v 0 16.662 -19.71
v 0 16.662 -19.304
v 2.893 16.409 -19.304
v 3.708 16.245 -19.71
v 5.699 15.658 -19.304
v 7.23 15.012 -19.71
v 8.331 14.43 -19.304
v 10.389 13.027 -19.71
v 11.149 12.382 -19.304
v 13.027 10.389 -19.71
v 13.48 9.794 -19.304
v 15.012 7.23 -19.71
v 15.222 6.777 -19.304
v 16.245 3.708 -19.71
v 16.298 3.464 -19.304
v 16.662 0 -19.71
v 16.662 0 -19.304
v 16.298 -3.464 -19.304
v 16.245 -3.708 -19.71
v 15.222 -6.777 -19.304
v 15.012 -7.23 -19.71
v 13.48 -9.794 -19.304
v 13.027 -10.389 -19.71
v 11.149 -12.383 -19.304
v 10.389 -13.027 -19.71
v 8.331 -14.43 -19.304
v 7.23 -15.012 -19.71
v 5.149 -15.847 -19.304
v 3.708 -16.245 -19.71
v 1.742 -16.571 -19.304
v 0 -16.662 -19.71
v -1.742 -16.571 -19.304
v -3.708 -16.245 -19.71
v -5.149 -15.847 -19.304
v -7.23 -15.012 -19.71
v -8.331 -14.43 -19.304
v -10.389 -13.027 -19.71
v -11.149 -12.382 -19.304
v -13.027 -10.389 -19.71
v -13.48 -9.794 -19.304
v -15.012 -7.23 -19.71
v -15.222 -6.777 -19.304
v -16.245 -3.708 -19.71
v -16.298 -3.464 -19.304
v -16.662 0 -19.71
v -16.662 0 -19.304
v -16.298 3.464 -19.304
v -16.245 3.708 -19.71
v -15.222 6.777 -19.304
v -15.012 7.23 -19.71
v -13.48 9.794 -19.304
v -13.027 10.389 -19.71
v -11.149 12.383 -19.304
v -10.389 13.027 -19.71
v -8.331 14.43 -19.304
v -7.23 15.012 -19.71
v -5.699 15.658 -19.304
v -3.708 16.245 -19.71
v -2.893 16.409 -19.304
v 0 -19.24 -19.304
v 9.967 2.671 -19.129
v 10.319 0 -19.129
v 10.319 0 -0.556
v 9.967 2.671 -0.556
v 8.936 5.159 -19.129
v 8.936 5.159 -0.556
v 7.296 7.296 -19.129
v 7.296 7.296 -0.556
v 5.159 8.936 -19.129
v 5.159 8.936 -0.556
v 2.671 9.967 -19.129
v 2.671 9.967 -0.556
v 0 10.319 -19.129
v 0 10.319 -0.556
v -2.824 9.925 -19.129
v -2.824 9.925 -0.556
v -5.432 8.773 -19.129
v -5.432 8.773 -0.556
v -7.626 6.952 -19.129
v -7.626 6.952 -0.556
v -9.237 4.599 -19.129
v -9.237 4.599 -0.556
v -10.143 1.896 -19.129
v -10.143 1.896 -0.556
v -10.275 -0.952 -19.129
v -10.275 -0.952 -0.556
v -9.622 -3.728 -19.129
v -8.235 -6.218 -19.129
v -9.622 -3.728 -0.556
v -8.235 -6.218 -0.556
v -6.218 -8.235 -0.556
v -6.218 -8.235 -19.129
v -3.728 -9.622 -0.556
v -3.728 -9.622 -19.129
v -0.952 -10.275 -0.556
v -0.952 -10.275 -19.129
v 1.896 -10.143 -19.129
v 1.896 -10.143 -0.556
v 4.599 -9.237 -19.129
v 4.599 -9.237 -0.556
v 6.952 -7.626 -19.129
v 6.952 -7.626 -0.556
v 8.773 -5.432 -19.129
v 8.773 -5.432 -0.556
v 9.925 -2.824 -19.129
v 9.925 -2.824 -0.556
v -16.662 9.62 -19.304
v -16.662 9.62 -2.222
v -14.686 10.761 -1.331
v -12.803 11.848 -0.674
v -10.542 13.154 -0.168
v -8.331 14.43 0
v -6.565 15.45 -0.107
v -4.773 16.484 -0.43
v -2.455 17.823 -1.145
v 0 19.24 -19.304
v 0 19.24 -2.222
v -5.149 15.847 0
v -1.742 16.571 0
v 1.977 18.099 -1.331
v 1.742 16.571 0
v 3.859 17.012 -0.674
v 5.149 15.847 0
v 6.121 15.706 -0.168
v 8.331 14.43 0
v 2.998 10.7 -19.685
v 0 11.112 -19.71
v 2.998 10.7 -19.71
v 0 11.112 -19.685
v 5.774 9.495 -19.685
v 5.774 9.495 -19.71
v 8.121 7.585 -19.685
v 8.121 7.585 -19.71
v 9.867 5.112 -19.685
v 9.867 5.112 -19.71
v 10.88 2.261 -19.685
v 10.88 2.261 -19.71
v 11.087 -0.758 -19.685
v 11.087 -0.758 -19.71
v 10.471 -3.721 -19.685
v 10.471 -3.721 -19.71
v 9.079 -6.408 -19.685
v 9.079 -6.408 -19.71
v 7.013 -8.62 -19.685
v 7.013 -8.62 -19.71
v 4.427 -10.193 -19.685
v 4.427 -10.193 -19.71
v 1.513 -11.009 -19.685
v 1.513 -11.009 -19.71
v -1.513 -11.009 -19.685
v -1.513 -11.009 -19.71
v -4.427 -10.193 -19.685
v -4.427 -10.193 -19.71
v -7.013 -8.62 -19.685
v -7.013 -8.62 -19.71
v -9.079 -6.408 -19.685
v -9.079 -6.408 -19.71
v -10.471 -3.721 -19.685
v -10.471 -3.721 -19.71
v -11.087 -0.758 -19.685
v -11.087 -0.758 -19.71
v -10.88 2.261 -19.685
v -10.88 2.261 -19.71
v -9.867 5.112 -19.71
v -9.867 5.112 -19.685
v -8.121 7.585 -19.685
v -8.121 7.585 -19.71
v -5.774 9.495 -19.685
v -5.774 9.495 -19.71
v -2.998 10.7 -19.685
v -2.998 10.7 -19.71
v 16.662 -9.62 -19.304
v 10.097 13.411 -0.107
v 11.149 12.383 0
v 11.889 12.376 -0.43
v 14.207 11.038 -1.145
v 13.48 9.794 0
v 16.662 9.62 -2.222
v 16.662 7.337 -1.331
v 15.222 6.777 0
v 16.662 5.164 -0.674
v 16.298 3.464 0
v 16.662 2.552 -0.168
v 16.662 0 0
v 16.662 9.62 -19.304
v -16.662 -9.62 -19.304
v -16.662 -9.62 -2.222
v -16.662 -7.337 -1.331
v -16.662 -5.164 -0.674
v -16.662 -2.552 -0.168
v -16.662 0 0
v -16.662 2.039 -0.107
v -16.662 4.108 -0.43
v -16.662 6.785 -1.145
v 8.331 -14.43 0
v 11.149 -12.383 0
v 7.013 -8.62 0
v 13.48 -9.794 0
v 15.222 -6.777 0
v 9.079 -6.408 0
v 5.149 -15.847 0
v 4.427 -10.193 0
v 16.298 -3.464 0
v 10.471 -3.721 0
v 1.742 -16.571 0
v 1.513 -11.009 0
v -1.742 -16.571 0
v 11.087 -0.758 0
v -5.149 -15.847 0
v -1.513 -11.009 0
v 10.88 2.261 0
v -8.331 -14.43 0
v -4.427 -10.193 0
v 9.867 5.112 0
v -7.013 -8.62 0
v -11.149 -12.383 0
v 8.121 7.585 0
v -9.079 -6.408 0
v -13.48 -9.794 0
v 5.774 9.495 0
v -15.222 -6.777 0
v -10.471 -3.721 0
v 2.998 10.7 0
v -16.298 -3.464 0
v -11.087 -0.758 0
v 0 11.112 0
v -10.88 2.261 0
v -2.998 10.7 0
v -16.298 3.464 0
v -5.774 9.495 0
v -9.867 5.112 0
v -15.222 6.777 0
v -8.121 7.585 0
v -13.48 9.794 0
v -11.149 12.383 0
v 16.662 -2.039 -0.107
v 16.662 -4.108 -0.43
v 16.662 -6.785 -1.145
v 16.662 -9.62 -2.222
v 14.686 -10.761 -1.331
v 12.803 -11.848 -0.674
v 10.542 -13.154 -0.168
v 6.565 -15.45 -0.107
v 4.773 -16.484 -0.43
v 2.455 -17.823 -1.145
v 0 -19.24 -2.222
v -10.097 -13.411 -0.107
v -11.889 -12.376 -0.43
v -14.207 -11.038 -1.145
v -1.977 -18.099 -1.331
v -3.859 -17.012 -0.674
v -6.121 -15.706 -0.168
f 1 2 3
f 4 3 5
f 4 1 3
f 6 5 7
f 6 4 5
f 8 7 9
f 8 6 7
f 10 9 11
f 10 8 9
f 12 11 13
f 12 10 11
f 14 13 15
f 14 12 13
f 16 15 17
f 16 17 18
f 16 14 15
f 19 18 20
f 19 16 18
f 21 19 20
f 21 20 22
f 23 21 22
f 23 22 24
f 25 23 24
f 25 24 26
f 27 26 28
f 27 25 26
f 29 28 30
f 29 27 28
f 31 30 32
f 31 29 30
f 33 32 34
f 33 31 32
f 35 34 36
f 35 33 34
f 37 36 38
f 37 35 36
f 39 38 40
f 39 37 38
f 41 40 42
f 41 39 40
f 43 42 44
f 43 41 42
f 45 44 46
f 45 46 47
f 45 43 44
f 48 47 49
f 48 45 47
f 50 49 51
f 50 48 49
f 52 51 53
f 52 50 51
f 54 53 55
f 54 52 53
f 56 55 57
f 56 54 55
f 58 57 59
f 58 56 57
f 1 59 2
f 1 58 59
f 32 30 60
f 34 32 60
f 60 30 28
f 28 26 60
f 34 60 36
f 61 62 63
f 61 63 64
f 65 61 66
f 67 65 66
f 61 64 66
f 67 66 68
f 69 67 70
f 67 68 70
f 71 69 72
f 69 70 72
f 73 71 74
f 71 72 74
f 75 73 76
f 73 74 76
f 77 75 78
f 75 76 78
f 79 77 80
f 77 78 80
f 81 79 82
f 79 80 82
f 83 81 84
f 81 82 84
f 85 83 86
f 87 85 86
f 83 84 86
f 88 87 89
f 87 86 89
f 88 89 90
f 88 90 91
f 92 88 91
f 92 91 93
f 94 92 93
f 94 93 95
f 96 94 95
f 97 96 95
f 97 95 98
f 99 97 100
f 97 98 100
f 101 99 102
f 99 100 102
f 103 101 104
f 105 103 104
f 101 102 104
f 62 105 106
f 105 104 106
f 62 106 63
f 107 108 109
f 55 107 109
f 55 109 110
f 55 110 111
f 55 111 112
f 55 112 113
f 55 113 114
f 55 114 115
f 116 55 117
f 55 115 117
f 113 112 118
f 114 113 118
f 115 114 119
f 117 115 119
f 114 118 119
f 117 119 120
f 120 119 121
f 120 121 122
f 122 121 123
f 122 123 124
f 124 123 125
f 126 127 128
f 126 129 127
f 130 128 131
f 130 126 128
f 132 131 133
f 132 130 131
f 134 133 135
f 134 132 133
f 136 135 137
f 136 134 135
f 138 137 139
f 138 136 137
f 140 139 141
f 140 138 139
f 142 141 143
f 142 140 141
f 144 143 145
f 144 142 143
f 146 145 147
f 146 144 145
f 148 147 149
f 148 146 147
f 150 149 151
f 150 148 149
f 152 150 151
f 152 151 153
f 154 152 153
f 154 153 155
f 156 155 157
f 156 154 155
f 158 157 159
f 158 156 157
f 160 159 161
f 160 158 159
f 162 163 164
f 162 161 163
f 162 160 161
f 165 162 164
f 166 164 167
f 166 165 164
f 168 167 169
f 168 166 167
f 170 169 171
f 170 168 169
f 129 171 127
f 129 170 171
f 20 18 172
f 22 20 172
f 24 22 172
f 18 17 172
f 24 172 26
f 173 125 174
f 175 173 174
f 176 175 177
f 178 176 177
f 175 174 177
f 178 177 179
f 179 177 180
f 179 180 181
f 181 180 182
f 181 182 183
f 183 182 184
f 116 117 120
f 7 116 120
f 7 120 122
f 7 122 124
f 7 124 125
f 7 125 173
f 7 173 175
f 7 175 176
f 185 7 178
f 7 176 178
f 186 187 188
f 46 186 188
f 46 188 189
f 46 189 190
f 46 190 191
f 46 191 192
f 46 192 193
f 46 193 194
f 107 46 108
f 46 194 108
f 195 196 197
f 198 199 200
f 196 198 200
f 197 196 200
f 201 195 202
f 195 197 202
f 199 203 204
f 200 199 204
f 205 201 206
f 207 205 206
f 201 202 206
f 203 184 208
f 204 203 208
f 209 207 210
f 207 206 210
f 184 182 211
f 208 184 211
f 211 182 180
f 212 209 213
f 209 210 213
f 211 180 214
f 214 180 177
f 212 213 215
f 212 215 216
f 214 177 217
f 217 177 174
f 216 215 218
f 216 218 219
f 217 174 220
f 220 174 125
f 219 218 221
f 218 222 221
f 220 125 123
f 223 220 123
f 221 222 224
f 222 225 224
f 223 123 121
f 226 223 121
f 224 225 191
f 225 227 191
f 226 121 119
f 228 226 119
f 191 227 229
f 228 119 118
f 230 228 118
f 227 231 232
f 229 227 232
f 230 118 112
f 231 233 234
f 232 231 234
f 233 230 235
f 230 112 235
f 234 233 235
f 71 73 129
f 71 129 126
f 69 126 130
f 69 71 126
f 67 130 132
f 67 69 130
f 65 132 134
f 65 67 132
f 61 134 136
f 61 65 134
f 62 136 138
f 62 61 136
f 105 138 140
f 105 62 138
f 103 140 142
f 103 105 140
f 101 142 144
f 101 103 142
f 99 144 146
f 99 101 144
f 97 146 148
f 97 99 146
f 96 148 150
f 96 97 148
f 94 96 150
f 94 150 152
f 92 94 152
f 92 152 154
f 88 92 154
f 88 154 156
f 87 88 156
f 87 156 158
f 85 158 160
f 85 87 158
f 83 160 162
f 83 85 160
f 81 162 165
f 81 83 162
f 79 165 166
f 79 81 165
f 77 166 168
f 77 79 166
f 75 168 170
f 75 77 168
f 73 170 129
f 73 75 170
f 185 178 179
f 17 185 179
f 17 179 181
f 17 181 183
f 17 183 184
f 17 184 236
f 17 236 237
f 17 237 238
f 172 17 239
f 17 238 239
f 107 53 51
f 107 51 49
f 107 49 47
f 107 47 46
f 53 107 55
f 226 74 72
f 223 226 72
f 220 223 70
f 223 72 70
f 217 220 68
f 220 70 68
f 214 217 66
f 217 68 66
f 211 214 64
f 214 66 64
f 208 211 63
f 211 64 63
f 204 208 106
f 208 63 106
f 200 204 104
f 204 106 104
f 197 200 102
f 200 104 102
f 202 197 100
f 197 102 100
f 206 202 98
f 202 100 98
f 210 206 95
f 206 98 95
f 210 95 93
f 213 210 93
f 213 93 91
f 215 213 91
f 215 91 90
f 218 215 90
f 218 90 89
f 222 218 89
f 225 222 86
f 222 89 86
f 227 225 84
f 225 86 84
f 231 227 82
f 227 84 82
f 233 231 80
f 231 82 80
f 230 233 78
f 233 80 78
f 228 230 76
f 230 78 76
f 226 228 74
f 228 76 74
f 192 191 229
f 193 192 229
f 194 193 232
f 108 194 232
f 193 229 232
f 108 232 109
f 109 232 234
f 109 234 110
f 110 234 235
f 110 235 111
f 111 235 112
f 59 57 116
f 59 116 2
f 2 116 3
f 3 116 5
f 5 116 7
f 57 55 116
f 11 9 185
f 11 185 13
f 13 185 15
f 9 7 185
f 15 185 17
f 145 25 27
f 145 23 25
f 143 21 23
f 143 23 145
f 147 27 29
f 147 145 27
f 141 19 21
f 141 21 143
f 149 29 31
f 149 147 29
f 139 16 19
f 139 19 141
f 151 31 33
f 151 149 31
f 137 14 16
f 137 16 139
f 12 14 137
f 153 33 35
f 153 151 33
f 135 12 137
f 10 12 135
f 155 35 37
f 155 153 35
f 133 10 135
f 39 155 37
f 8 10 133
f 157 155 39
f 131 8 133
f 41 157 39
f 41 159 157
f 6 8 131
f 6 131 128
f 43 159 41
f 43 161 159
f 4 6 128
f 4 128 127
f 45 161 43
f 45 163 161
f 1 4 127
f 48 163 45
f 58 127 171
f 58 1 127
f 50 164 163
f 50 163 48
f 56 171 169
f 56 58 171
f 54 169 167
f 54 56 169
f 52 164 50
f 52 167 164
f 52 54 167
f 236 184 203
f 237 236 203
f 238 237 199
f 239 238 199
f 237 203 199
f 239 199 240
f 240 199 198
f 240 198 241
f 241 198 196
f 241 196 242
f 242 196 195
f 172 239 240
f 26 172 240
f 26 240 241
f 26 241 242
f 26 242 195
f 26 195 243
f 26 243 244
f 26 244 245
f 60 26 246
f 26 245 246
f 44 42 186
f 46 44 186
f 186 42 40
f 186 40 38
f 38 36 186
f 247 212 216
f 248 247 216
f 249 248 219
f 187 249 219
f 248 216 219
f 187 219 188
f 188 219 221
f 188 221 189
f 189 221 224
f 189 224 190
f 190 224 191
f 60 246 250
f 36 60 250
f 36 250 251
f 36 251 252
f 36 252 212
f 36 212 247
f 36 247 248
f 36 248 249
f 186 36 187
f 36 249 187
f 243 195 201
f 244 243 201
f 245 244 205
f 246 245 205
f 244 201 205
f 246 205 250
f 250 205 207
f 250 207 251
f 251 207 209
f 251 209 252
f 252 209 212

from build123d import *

# Parameters (mm, degrees)
BASENUTSKE_R  = 10.31875
BASENUT_DEPTH = 19.7104
SKETCH4_W     = 0.4064
SKETCH4_H     = 15.277682251


with BuildPart() as part:
    # BaseNutSke → BaseNut (new body)
    with BuildSketch(Plane.XY):
        Polygon((16.6624, 9.620041125), (16.6624, -9.620041125), (0, -19.240082251), (-16.6624, -9.620041125), (-16.6624, 9.620041125), (0, 19.240082251), align=None)
        Circle(BASENUTSKE_R, mode=Mode.SUBTRACT)
    extrude(amount=-BASENUT_DEPTH)

    # Sketch4 → Bearing-Face (revolve, cut)
    with BuildSketch(Plane(origin=(0, 0, 0), x_dir=(0, 0, -1), z_dir=(1, 0, 0))):
        with Locations((19.5072, 24.301241126)):
            Rectangle(SKETCH4_W, SKETCH4_H)
        Polygon((0, 16.6624), (-12.7, 16.6624), (-12.7, 31.940082251), (2.2225, 31.940082251), (2.2225, 19.240082251), align=None)
    revolve(axis=Axis((0, 0, 0), (0, 0, -1)), mode=Mode.SUBTRACT)

    # Sketch5 → EndChamfer (revolve, cut)
    with BuildSketch(Plane(origin=(0, 0, 0), x_dir=(0, 0, -1), z_dir=(1, 0, 0))):
        Polygon((19.685, 11.1125), (19.073631293, 10.239375), (19.7358, 10.239375), (19.7358, 11.1125), align=None)
        Polygon((-0.0508, 11.1125), (0, 11.1125), (0.611368707, 10.239375), (-0.0508, 10.239375), align=None)
    revolve(axis=Axis((0, 0, -25.037505729), (0, 0, -1)), mode=Mode.SUBTRACT)


solid = part.part
